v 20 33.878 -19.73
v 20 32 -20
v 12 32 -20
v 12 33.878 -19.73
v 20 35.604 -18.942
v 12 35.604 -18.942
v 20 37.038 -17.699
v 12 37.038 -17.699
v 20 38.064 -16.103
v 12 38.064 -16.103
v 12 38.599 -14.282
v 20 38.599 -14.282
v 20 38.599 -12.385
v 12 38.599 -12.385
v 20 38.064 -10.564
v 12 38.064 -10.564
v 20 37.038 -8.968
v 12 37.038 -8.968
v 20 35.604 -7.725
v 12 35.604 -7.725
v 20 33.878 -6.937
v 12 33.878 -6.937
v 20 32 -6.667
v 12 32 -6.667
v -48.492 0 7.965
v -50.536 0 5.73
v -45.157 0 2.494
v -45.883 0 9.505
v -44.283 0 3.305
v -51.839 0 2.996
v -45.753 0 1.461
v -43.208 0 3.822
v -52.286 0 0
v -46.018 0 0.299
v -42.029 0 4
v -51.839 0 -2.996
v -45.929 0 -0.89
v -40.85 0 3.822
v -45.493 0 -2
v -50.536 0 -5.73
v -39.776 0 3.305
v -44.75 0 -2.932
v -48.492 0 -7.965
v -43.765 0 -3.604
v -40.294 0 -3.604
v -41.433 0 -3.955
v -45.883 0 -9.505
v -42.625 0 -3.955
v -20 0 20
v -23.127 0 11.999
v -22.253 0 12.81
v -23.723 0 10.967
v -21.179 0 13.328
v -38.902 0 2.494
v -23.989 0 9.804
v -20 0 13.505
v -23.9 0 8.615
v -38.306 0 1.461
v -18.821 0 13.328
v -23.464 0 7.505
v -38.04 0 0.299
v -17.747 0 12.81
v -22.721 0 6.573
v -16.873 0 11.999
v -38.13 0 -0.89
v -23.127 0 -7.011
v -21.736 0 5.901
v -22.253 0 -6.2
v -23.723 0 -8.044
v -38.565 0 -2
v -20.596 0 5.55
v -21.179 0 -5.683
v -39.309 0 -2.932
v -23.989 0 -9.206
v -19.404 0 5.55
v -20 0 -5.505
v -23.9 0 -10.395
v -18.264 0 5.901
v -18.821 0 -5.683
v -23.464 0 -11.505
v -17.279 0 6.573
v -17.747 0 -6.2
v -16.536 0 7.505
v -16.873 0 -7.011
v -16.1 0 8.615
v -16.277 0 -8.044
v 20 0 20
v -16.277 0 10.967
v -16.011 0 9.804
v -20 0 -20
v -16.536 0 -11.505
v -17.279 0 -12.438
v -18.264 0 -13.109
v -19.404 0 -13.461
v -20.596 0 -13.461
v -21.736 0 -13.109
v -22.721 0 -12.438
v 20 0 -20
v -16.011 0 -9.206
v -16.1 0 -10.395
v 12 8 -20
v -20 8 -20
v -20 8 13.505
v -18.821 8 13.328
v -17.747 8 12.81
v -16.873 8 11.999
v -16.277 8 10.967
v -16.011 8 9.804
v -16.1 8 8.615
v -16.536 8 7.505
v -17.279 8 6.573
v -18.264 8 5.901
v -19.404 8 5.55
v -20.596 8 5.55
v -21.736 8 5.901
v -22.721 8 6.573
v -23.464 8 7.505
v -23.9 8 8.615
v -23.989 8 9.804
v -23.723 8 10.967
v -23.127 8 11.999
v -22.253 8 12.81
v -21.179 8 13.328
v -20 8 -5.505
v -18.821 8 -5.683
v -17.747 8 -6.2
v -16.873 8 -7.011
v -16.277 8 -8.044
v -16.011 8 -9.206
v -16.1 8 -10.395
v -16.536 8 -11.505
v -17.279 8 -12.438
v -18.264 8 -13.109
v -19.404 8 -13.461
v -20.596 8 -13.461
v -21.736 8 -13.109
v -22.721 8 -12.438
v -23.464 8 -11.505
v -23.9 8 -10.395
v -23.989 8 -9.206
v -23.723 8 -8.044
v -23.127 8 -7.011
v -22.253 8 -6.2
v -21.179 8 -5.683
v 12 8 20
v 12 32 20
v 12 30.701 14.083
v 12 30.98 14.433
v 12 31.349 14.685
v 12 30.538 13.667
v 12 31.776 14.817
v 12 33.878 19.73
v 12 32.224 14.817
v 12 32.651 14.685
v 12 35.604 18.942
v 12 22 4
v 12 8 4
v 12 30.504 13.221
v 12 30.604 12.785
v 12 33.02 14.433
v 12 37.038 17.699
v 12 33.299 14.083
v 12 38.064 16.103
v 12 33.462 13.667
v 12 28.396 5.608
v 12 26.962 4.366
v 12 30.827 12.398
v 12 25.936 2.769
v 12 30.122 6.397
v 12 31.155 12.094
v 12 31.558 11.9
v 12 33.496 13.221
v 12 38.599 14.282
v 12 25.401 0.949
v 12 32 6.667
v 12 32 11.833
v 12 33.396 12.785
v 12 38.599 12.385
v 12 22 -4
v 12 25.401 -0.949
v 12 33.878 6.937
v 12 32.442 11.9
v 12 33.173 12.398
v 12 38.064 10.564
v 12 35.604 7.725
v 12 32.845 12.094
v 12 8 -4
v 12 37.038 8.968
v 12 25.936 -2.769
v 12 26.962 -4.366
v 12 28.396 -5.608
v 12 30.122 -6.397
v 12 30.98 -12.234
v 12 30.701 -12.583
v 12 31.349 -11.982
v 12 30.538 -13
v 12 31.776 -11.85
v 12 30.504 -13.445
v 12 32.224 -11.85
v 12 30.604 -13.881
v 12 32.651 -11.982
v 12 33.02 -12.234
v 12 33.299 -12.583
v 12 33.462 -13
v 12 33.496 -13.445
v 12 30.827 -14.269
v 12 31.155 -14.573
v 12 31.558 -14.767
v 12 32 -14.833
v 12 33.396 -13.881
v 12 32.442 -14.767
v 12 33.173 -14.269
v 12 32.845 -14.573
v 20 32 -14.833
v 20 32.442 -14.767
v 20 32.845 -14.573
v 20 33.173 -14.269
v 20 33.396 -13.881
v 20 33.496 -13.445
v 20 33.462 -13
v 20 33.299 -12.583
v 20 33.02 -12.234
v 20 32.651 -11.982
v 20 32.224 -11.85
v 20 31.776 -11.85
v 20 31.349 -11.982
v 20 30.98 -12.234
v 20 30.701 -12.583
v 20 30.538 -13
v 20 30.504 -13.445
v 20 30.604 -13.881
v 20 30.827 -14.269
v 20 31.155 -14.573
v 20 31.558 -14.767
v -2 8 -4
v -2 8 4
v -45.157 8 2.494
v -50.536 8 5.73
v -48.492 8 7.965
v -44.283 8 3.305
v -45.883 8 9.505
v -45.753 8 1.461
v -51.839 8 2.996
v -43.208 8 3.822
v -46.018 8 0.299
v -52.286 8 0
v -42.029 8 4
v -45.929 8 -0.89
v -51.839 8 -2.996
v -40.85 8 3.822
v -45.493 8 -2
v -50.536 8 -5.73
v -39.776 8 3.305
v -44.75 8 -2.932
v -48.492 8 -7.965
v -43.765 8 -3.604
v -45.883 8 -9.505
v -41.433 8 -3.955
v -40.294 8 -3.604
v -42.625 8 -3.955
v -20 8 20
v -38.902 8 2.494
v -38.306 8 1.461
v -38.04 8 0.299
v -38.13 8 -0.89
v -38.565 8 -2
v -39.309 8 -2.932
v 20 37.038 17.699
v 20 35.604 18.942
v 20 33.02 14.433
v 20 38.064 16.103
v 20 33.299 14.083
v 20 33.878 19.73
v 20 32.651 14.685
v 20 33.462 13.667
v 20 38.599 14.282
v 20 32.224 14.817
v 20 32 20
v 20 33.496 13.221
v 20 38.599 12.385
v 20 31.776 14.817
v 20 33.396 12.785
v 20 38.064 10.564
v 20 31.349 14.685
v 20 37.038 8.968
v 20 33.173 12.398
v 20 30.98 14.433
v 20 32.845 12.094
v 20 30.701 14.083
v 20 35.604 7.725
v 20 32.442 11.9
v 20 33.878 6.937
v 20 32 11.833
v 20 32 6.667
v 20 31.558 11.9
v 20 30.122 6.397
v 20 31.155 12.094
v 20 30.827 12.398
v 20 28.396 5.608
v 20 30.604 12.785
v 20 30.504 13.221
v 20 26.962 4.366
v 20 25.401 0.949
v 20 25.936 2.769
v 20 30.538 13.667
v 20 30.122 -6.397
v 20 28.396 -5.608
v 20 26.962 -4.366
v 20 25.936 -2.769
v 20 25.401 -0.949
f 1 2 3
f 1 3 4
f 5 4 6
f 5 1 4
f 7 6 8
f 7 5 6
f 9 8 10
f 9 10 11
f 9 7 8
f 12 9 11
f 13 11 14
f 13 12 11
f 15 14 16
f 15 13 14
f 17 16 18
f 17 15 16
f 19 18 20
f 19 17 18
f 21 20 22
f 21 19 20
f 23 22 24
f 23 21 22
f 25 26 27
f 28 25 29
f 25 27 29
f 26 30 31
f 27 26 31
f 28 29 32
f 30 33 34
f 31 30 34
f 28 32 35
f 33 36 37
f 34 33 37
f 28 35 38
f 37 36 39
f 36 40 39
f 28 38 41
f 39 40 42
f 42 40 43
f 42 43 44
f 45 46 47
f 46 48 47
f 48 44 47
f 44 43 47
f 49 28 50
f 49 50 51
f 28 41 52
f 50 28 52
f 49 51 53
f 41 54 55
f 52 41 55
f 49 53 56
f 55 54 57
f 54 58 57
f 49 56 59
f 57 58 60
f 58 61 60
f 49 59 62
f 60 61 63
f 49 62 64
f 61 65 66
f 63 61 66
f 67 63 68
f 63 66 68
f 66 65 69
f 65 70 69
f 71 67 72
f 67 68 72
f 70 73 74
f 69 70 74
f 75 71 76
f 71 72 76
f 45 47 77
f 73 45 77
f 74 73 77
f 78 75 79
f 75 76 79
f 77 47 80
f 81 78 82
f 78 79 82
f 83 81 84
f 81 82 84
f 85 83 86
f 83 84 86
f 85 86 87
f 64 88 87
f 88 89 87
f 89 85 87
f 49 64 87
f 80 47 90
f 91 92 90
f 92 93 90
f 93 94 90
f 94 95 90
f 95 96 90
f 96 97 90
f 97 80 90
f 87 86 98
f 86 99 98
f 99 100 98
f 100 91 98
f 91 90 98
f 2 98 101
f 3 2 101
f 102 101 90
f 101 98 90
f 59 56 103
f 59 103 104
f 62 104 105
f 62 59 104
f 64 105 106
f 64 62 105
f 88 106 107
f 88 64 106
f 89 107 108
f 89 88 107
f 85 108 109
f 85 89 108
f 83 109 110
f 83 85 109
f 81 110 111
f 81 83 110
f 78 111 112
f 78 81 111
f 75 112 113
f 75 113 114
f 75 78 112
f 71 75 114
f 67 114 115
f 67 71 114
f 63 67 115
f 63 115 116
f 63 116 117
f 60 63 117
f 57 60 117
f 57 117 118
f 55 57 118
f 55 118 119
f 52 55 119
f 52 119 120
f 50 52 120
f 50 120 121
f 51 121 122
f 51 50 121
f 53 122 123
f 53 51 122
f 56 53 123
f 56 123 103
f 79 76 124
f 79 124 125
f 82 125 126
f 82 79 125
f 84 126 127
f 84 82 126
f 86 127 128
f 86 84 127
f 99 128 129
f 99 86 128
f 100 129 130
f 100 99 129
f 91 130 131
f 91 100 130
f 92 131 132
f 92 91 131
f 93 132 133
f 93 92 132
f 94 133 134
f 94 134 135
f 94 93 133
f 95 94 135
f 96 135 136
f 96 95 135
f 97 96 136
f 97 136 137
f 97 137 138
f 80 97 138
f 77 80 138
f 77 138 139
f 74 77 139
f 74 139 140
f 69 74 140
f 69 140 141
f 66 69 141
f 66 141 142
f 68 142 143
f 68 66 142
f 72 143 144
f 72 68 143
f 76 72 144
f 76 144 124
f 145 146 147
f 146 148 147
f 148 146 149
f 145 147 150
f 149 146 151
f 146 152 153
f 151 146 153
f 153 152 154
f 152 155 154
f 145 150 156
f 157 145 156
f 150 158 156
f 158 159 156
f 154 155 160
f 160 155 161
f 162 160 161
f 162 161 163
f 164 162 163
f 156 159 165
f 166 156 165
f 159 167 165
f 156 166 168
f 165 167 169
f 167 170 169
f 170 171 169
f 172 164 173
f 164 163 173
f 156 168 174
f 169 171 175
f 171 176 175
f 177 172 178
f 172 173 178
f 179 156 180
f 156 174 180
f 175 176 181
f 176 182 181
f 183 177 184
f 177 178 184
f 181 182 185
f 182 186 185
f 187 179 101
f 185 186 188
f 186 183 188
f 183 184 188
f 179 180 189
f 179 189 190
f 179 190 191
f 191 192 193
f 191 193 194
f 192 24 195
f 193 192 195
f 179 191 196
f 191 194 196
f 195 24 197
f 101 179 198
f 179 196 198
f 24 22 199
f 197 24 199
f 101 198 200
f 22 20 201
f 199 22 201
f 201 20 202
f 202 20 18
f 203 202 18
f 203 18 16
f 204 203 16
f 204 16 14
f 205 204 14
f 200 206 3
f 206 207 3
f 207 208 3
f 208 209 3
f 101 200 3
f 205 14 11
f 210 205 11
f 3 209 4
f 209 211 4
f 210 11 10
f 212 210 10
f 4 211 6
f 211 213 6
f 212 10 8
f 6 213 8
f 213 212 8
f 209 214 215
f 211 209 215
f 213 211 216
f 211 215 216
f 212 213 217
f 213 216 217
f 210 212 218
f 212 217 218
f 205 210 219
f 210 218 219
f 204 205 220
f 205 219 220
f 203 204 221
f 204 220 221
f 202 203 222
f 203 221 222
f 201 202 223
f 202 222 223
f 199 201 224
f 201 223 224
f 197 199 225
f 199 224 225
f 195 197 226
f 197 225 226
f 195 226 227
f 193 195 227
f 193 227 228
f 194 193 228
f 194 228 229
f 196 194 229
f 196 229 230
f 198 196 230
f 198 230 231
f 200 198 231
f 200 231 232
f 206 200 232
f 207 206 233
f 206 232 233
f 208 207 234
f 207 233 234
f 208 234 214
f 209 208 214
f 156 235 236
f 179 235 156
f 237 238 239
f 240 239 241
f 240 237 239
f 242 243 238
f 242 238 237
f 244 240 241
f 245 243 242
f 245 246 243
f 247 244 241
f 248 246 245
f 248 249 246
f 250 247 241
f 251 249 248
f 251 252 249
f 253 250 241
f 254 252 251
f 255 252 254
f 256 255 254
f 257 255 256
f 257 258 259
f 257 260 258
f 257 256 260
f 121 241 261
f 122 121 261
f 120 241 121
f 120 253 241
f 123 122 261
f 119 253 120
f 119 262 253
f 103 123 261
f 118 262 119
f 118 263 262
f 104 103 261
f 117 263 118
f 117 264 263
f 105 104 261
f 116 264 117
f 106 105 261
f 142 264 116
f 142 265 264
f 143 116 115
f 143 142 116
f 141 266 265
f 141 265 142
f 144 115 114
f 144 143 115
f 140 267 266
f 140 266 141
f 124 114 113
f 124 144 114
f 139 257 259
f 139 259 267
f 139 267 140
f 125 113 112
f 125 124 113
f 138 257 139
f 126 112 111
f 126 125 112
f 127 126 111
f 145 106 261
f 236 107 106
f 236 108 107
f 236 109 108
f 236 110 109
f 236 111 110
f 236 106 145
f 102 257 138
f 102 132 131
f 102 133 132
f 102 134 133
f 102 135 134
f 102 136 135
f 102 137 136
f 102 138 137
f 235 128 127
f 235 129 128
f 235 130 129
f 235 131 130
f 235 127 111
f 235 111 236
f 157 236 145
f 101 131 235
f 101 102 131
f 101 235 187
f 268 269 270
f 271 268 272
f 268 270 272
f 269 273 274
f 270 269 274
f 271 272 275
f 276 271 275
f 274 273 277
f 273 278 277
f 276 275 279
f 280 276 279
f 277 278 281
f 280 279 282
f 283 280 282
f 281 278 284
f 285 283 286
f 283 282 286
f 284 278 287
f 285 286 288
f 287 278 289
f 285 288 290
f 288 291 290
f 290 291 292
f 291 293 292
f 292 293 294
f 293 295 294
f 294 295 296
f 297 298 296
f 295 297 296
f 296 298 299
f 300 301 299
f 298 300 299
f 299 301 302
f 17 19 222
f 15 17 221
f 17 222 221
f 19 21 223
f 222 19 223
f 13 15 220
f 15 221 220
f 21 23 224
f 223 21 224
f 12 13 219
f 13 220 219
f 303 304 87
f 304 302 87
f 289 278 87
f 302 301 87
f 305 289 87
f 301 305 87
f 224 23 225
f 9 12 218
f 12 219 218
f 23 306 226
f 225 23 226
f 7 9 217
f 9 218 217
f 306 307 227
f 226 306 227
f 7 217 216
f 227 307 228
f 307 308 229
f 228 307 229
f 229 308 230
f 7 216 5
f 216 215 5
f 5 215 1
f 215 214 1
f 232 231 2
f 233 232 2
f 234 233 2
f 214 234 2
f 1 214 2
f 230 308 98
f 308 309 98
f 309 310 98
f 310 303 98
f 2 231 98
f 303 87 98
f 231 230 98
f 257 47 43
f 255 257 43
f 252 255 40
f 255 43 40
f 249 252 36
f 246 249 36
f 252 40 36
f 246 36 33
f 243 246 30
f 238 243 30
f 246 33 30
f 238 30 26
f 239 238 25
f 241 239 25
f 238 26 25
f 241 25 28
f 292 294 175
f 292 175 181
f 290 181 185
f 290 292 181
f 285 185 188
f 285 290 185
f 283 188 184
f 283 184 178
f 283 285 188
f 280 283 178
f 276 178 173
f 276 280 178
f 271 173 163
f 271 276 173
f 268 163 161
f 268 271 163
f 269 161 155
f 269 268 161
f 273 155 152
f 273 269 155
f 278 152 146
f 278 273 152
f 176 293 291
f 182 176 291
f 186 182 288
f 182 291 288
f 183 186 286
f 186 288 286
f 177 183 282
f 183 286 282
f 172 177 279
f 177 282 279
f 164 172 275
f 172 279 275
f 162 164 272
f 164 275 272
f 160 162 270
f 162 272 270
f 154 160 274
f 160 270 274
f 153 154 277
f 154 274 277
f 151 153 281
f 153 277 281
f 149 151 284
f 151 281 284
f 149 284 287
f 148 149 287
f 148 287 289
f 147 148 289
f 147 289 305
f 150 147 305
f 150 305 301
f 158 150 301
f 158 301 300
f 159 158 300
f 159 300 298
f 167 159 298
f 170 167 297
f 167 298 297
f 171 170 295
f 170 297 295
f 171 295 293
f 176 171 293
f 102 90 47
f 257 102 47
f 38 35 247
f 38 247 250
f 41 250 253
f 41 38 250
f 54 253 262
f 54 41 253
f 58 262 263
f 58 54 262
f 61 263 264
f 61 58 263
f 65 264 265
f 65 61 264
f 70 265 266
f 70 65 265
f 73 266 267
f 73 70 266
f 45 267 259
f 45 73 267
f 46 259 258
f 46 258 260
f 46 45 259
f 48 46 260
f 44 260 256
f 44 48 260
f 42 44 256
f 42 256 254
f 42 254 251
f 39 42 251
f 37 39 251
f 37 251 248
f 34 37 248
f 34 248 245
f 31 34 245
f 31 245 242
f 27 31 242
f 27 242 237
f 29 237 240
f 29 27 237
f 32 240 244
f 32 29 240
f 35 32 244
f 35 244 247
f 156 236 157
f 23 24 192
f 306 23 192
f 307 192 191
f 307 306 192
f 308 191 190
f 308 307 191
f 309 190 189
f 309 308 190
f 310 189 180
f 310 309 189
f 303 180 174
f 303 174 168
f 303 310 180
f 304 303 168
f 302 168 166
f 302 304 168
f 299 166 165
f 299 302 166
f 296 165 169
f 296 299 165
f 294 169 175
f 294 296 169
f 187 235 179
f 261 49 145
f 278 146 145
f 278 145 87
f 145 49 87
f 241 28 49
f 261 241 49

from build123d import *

# Parameters (mm, degrees)
SKETCH_2_R      = 4
EXTRUDE_1_DEPTH = 8
SKETCH_3_R      = 1.5
EXTRUDE_4_DEPTH = 8
RIB_1_REACH     = 70.036
SKETCH_9_WALL_W = 157.87192052
SKETCH_9_WALL_H = 8


with BuildPart() as part:
    # 草图2 → 凸台-拉伸1 (new body)
    with BuildSketch(Plane(origin=(0, 0, 0), x_dir=(1, 0, 0), z_dir=(0, 1, 0))):
        with BuildLine():
            Line((-20, 20), (-45.883337968, 9.505308716))
            ThreePointArc((-45.883337968, 9.505308716), (-52.286226701, 0), (-45.883337968, -9.505308716))
            Line((-45.883337968, -9.505308716), (-20, -20))
            Line((-20, -20), (20, -20))
            Line((20, -20), (20, 20))
            Line((20, 20), (-20, 20))
        make_face()
        with Locations(Location((-42.029303351, 0, 0), (0, 0, 270))):
            Circle(SKETCH_2_R, mode=Mode.SUBTRACT)
        with Locations(Location((-20, 9.505308716, 0), (0, 0, 270))):
            Circle(SKETCH_2_R, mode=Mode.SUBTRACT)
        with Locations(Location((-20, -9.505308716, 0), (0, 0, 270))):
            Circle(SKETCH_2_R, mode=Mode.SUBTRACT)
    extrude(amount=EXTRUDE_1_DEPTH)

    # 草图3 → 凸台-拉伸4 (add)
    with BuildSketch(Plane(origin=(20, 0, 0), x_dir=(0, 0, -1), z_dir=(1, 0, 0))):
        with BuildLine():
            Line((-20, 0), (20, 0))
            Line((20, 0), (20, 32))
            ThreePointArc((20, 32), (13.333333333, 38.666666667), (6.666666667, 32))
            ThreePointArc((6.666666667, 32), (0, 25.333333333), (-6.666666667, 32))
            ThreePointArc((-6.666666667, 32), (-13.333333333, 38.666666667), (-20, 32))
            Line((-20, 32), (-20, 0))
        make_face()
        with Locations((-13.333333333, 32)):
            Circle(SKETCH_3_R, mode=Mode.SUBTRACT)
        with Locations((13.333333333, 32)):
            Circle(SKETCH_3_R, mode=Mode.SUBTRACT)
    extrude(amount=-EXTRUDE_4_DEPTH)

    # 草图9 wall → 筋1 (add, up to next)
    with BuildSketch(Plane(origin=(5, 15, 0), x_dir=(0.707106781187, 0.707106781187, 0), z_dir=(-0.707106781187, 0.707106781187, 0)), mode=Mode.PRIVATE) as rib_1_sk1:
        Rectangle(SKETCH_9_WALL_W, SKETCH_9_WALL_H)
    rib_1_tool1 = extrude(rib_1_sk1.sketch, amount=-RIB_1_REACH, mode=Mode.PRIVATE) - part.part
    add(rib_1_tool1.solids().sort_by_distance((5, 15, 0))[0])


solid = part.part
